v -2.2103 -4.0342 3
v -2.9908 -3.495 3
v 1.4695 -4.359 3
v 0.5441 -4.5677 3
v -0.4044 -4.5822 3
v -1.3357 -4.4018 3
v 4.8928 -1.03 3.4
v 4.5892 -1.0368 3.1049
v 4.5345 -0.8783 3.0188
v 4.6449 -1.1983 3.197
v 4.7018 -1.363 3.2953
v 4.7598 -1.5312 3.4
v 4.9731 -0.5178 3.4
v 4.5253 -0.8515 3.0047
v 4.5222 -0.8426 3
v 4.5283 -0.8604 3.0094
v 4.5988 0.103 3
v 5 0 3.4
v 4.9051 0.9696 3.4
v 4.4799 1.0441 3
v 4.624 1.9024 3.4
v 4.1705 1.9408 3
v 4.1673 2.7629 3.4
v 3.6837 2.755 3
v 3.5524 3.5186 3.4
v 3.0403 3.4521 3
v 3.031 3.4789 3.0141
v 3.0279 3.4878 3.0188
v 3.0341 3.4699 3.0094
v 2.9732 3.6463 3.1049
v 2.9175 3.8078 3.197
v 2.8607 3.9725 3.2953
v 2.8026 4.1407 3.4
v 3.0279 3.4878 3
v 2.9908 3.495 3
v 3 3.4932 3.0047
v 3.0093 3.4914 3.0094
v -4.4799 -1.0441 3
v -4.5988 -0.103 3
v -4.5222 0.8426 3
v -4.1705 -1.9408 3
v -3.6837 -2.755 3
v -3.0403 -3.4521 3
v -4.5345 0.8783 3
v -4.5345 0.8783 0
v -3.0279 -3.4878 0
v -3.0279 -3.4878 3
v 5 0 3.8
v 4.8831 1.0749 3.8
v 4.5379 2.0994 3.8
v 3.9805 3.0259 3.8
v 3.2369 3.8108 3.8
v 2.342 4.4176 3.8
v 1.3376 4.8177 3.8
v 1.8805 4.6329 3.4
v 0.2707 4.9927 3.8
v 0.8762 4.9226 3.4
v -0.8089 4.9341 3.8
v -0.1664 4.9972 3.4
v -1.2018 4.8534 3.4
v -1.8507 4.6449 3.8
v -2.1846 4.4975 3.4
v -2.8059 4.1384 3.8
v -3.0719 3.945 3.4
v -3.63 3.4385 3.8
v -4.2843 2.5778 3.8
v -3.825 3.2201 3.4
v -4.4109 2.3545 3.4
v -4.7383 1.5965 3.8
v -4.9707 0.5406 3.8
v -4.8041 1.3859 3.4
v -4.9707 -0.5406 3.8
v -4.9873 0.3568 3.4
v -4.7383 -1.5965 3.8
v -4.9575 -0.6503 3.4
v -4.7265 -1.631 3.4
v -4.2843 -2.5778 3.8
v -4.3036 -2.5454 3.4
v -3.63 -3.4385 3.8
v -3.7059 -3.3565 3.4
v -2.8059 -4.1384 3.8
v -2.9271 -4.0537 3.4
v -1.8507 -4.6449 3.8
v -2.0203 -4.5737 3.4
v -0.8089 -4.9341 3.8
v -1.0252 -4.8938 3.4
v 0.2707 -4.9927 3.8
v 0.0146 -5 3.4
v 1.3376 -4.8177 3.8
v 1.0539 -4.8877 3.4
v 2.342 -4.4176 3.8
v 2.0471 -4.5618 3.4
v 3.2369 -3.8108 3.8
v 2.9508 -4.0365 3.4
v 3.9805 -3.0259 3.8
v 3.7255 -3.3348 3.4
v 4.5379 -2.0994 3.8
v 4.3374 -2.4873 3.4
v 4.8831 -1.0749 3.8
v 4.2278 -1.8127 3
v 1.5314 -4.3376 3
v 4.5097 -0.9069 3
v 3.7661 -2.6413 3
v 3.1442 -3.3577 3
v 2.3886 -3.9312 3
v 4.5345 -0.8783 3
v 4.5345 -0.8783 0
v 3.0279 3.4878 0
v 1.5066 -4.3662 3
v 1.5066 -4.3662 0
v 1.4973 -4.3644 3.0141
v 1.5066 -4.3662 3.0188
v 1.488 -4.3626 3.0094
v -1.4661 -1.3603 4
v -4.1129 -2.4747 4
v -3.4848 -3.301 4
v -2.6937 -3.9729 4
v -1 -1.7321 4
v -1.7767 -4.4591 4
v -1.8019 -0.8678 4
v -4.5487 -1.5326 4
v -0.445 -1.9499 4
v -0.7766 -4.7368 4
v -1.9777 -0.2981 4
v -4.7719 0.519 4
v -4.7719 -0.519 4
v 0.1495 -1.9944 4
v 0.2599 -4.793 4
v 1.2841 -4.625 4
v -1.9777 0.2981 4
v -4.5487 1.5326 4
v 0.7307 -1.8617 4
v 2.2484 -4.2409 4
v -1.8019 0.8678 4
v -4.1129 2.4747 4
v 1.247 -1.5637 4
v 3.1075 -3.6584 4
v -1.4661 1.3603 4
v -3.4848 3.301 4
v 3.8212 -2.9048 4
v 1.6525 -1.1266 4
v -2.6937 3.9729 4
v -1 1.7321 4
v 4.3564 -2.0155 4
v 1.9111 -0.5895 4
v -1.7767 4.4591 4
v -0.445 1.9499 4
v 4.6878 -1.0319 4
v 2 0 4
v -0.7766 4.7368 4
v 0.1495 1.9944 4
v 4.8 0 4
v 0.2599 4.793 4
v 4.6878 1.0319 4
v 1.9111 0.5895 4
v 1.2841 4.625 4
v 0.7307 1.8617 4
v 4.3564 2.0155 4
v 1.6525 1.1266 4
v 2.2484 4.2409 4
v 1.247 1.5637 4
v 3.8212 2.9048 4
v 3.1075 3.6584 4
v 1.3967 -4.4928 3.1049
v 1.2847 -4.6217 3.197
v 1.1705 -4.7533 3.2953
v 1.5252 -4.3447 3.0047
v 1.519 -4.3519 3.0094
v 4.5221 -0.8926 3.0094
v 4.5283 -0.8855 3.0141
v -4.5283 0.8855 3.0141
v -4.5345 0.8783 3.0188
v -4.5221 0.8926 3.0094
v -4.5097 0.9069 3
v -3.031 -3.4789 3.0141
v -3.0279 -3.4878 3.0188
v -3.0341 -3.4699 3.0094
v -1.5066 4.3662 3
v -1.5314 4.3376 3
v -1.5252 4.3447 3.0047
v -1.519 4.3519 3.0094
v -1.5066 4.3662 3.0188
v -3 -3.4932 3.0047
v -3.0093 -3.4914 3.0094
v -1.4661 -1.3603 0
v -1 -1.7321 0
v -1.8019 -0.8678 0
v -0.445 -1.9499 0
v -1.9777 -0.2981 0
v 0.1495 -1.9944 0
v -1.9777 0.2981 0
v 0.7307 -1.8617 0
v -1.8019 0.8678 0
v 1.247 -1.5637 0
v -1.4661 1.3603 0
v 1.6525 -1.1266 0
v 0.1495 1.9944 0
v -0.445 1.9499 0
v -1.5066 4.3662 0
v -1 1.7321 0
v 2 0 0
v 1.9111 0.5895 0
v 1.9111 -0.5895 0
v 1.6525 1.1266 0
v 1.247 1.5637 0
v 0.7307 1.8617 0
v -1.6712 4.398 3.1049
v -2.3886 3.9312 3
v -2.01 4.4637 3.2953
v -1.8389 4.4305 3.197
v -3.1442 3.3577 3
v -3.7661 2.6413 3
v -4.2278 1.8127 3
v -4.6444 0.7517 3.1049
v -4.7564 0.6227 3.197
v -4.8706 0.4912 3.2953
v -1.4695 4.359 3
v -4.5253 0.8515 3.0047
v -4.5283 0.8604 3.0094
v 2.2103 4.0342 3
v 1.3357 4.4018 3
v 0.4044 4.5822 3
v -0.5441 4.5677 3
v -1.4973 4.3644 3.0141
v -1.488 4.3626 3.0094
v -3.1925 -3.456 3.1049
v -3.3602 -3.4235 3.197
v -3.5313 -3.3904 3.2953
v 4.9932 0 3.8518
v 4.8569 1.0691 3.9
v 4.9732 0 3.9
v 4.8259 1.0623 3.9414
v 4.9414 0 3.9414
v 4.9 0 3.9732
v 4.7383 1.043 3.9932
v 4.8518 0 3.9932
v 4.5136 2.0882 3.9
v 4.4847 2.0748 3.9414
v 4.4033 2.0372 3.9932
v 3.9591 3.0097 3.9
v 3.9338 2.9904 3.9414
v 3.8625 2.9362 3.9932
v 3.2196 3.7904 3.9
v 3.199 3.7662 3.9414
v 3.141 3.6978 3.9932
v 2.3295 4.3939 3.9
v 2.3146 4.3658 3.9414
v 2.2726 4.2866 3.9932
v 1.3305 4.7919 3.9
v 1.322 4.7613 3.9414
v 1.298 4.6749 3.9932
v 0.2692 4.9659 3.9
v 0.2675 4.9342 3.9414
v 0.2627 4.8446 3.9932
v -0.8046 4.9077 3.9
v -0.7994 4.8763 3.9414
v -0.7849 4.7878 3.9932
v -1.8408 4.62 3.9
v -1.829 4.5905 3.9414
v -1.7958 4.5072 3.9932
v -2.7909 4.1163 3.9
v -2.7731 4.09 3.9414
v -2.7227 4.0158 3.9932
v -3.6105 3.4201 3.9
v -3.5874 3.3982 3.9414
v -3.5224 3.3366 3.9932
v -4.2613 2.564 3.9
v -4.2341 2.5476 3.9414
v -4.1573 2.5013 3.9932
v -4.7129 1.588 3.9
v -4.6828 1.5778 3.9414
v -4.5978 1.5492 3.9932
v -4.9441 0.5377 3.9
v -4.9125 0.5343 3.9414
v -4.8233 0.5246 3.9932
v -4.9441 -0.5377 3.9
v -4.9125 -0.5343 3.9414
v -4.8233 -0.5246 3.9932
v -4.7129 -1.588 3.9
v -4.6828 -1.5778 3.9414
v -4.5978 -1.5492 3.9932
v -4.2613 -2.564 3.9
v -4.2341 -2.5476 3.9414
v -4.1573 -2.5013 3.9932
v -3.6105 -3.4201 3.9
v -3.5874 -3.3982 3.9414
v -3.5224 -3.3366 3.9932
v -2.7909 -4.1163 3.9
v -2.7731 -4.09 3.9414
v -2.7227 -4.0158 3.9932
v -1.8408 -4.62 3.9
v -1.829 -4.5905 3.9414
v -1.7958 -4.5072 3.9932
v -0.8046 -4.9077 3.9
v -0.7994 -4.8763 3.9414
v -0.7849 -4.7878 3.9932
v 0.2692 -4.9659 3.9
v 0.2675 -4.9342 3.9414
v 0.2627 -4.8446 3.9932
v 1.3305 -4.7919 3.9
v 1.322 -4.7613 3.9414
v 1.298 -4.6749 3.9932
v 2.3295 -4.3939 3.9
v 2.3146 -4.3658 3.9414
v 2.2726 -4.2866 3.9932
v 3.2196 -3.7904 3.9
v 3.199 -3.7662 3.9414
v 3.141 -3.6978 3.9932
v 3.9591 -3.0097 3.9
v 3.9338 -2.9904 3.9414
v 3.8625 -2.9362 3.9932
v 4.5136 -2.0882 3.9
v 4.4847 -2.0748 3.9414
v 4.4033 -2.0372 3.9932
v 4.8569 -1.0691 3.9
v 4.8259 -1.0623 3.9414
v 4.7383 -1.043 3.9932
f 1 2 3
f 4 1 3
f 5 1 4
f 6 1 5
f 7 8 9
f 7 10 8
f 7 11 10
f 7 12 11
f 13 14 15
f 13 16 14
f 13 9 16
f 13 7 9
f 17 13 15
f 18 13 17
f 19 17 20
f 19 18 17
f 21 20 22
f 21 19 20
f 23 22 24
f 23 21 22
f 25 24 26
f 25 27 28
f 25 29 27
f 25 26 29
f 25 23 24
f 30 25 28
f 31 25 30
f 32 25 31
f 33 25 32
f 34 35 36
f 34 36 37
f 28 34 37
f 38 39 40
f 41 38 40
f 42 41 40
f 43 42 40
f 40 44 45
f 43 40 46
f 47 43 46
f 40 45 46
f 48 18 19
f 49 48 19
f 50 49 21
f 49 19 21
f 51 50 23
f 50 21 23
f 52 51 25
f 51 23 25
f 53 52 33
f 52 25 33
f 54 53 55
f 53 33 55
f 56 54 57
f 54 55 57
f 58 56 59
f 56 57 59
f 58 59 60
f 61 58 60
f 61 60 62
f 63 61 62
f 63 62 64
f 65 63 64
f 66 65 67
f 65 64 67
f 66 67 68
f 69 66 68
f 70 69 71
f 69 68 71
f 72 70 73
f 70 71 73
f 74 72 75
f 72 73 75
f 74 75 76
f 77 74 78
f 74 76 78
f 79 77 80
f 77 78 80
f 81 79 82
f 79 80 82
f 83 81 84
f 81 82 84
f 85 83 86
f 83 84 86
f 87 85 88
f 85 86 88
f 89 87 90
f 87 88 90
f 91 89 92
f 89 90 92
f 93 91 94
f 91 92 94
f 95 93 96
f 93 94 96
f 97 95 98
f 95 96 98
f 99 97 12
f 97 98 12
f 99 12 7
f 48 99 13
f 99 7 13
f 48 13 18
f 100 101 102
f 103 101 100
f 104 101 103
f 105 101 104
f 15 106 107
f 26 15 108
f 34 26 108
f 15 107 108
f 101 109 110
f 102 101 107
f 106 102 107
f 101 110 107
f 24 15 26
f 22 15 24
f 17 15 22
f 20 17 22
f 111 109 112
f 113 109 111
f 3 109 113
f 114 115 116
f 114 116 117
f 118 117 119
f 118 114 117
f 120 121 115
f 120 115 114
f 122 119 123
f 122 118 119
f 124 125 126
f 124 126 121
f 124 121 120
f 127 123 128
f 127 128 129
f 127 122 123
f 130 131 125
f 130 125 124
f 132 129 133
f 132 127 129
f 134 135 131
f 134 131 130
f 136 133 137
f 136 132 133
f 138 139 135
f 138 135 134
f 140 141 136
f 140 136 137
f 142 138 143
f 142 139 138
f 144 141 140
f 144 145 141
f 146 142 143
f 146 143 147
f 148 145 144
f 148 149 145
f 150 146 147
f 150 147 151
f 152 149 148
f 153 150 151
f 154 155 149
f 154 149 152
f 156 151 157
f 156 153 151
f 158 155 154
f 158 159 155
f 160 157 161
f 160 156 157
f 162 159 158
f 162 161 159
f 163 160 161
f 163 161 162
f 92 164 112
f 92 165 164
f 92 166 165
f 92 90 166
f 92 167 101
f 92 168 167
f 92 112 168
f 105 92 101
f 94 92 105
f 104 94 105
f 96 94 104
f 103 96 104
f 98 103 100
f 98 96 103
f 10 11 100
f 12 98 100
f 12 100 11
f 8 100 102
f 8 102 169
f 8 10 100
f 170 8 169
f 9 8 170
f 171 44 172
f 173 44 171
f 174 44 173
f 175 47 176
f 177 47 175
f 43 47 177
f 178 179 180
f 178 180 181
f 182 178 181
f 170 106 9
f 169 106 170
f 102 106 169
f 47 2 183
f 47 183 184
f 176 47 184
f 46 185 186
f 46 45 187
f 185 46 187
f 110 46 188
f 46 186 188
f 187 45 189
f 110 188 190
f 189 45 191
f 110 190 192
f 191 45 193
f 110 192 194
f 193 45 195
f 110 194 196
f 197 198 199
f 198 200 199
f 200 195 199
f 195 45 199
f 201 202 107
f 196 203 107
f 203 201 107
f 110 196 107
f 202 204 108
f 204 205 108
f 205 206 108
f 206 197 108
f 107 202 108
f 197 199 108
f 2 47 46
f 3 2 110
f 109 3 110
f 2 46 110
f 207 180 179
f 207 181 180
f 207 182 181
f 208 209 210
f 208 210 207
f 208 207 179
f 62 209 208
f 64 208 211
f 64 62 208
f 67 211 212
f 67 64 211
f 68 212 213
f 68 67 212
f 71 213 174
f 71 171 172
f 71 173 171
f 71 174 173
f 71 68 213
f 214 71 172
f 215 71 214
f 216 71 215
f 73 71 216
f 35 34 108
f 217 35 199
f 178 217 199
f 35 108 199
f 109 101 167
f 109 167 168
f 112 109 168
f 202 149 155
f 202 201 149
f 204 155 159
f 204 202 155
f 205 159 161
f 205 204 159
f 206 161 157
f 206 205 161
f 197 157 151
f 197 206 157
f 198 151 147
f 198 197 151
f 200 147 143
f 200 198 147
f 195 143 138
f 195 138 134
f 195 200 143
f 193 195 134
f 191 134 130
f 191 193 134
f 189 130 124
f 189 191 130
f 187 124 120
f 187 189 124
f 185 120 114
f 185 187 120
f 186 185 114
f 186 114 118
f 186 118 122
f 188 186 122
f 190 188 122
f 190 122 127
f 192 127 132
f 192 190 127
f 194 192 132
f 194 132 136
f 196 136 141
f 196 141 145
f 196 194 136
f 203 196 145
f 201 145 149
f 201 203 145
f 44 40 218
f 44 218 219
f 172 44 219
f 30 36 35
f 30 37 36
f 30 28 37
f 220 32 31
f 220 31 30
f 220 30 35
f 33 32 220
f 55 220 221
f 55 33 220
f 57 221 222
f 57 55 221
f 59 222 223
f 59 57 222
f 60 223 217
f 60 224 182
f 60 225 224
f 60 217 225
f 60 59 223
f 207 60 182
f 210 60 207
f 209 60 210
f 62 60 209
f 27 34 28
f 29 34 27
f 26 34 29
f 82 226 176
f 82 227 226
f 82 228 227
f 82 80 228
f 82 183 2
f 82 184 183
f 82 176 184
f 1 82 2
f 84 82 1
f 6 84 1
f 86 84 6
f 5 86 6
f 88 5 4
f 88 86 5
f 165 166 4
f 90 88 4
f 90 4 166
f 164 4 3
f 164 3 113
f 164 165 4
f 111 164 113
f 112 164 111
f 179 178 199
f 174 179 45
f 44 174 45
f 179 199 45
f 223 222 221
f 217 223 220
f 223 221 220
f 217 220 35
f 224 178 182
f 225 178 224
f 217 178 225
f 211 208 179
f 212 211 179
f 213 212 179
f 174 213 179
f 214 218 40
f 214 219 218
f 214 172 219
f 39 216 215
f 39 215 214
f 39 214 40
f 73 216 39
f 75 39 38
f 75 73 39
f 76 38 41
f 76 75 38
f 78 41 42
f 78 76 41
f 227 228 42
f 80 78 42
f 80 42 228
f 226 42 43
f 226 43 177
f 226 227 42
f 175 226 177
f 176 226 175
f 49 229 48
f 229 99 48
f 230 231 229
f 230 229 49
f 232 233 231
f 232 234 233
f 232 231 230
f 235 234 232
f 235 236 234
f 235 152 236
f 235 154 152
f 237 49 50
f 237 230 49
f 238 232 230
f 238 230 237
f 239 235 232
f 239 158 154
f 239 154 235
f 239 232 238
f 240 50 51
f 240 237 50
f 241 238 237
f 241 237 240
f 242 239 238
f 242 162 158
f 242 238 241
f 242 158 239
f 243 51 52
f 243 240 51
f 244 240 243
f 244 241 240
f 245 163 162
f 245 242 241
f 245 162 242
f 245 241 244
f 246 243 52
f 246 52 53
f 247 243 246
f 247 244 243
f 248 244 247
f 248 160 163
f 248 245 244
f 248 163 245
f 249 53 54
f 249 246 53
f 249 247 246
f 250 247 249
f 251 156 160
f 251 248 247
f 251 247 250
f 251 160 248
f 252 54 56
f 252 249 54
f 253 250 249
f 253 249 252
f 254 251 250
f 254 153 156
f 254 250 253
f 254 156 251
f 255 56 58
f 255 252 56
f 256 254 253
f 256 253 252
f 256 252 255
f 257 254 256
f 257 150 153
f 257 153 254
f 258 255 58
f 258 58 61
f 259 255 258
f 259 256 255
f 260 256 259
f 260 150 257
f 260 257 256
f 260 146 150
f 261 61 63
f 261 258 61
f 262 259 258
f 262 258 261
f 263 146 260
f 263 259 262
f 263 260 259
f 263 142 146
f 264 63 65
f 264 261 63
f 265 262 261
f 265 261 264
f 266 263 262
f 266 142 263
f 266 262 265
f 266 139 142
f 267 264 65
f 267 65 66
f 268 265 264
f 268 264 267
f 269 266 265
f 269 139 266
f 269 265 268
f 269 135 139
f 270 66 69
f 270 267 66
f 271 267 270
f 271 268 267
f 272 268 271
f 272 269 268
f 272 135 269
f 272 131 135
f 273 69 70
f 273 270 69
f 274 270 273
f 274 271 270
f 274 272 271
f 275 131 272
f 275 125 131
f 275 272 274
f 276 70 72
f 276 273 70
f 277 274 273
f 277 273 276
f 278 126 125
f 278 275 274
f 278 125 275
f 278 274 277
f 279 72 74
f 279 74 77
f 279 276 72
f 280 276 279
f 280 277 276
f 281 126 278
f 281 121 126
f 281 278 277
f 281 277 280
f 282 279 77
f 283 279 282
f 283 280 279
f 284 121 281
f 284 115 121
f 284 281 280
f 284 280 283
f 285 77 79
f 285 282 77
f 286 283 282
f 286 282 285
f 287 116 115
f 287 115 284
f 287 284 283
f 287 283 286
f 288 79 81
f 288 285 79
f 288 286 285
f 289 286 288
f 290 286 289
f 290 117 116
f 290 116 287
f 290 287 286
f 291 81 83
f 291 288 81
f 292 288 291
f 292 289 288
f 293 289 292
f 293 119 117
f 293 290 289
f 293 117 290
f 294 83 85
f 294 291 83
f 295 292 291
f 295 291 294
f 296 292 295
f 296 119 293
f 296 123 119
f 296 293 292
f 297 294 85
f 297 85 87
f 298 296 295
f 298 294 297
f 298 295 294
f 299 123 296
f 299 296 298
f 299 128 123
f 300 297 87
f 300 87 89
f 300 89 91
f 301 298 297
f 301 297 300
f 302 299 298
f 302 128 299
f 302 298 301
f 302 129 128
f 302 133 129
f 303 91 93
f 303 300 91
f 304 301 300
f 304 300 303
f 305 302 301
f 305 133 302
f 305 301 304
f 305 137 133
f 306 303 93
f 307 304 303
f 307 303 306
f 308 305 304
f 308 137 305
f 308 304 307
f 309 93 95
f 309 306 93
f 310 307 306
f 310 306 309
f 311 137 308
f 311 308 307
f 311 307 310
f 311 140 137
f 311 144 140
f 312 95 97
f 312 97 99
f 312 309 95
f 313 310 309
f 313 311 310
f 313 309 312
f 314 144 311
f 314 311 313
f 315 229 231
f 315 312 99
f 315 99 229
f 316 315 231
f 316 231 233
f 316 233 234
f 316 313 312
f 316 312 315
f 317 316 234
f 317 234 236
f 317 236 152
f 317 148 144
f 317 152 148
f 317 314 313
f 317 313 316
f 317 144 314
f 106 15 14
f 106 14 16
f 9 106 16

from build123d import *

# Parameters (mm, degrees)
F0_R     = 2
F1_DEPTH = 3
F2_R     = 5
F2_R_2   = 2
F3_DEPTH = 1
F5_R     = 0.2


# Not quite as in the source:
# - a fillet or chamfer that OpenCascade refuses, or shapes differently, is made with other operations: its cross-section is extruded or revolved along the edge and cut away or added


with BuildPart() as f1:
    # F0 (on Top) → F1 (new body)
    with BuildSketch(Plane.XY):
        Polygon((1.5066089403, -4.3661725612), (4.5345208255, -0.8783246648), (3.0279118852, 3.4878478965), (-1.5066089403, 4.3661725612), (-4.5345208255, 0.8783246648), (-3.0279118852, -3.4878478965), align=None)
        Circle(F0_R, mode=Mode.SUBTRACT)
    extrude(amount=F1_DEPTH)

    # F2 (on face) → F3 (join)
    with BuildSketch(Plane.XY.offset(3)):
        Circle(F2_R)
        Circle(F2_R_2, mode=Mode.SUBTRACT)
    extrude(amount=F3_DEPTH)

    # F4: chamfer of 0.4 on 1 edges, made by hand


with BuildPart() as f4_tool2:
    # F4_s3 → F4_t4 (revolve)
    with BuildSketch(Plane.XZ):
        Polygon((4.6, 3), (5, 3.4), (5, 3), align=None)
    revolve(axis=Axis((0, 0, 3), (0, 0, 1)))

    split(bisect_by=Plane(origin=(3.7812163553, 1.3047616158, 0), x_dir=(0, 0, 1), z_dir=(0.9453040888, 0.326190404, 0)), keep=Keep.TOP)


with BuildPart() as f1_1:
    add(f1.part)

    # F4_t1: cut F4_tool2
    add(f4_tool2.part, mode=Mode.SUBTRACT)


with BuildPart() as f4_tool7:
    # F4_s8 → F4_t9 (revolve)
    with BuildSketch(Plane.XZ):
        Polygon((4.6, 3), (5, 3.4), (5, 3), align=None)
    revolve(axis=Axis((0, 0, 3), (0, 0, 1)))

    split(bisect_by=Plane(origin=(0.7606514725, 3.9270102288, 0), x_dir=(0, 0, 1), z_dir=(0.1901628681, 0.9817525572, 0)), keep=Keep.TOP)


with BuildPart() as f1_2:
    add(f1_1.part)

    # F4_t6: cut F4_tool7
    add(f4_tool7.part, mode=Mode.SUBTRACT)


with BuildPart() as f4_tool12:
    # F4_s13 → F4_t14 (revolve)
    with BuildSketch(Plane.XZ):
        Polygon((4.6, 3), (5, 3.4), (5, 3), align=None)
    revolve(axis=Axis((0, 0, 3), (0, 0, 1)))

    split(bisect_by=Plane(origin=(3.0205648829, -2.622248613, 0), x_dir=(0, 0, 1), z_dir=(0.7551412207, -0.6555621532, 0)), keep=Keep.TOP)


with BuildPart() as f1_3:
    add(f1_2.part)

    # F4_t11: cut F4_tool12
    add(f4_tool12.part, mode=Mode.SUBTRACT)


with BuildPart() as f4_tool17:
    # F4_s18 → F4_t19 (revolve)
    with BuildSketch(Plane.XZ):
        Polygon((4.6, 3), (5, 3.4), (5, 3), align=None)
    revolve(axis=Axis((0, 0, 3), (0, 0, 1)))

    split(bisect_by=Plane(origin=(-3.0205648829, 2.622248613, 0), x_dir=(0, 0, 1), z_dir=(-0.7551412207, 0.6555621532, 0)), keep=Keep.TOP)


with BuildPart() as f1_4:
    add(f1_3.part)

    # F4_t16: cut F4_tool17
    add(f4_tool17.part, mode=Mode.SUBTRACT)


with BuildPart() as f4_tool22:
    # F4_s23 → F4_t24 (revolve)
    with BuildSketch(Plane.XZ):
        Polygon((4.6, 3), (5, 3.4), (5, 3), align=None)
    revolve(axis=Axis((0, 0, 3), (0, 0, 1)))

    split(bisect_by=Plane(origin=(-0.7606514725, -3.9270102288, 0), x_dir=(0, 0, 1), z_dir=(-0.1901628681, -0.9817525572, 0)), keep=Keep.TOP)


with BuildPart() as f1_5:
    add(f1_4.part)

    # F4_t21: cut F4_tool22
    add(f4_tool22.part, mode=Mode.SUBTRACT)


with BuildPart() as f4_tool27:
    # F4_s28 → F4_t29 (revolve)
    with BuildSketch(Plane.XZ):
        Polygon((4.6, 3), (5, 3.4), (5, 3), align=None)
    revolve(axis=Axis((0, 0, 3), (0, 0, 1)))

    split(bisect_by=Plane(origin=(-3.7812163553, -1.3047616158, 0), x_dir=(0, 0, 1), z_dir=(-0.9453040888, -0.326190404, 0)), keep=Keep.TOP)


with BuildPart() as f1_6:
    add(f1_5.part)

    # F4_t26: cut F4_tool27
    add(f4_tool27.part, mode=Mode.SUBTRACT)

    # F5
    f5_edges = [f1_6.edges().sort_by_distance(p)[0] for p in [
        (-5, 0, 4),
    ]]
    fillet(f5_edges, radius=F5_R)


solid = f1_6.part
